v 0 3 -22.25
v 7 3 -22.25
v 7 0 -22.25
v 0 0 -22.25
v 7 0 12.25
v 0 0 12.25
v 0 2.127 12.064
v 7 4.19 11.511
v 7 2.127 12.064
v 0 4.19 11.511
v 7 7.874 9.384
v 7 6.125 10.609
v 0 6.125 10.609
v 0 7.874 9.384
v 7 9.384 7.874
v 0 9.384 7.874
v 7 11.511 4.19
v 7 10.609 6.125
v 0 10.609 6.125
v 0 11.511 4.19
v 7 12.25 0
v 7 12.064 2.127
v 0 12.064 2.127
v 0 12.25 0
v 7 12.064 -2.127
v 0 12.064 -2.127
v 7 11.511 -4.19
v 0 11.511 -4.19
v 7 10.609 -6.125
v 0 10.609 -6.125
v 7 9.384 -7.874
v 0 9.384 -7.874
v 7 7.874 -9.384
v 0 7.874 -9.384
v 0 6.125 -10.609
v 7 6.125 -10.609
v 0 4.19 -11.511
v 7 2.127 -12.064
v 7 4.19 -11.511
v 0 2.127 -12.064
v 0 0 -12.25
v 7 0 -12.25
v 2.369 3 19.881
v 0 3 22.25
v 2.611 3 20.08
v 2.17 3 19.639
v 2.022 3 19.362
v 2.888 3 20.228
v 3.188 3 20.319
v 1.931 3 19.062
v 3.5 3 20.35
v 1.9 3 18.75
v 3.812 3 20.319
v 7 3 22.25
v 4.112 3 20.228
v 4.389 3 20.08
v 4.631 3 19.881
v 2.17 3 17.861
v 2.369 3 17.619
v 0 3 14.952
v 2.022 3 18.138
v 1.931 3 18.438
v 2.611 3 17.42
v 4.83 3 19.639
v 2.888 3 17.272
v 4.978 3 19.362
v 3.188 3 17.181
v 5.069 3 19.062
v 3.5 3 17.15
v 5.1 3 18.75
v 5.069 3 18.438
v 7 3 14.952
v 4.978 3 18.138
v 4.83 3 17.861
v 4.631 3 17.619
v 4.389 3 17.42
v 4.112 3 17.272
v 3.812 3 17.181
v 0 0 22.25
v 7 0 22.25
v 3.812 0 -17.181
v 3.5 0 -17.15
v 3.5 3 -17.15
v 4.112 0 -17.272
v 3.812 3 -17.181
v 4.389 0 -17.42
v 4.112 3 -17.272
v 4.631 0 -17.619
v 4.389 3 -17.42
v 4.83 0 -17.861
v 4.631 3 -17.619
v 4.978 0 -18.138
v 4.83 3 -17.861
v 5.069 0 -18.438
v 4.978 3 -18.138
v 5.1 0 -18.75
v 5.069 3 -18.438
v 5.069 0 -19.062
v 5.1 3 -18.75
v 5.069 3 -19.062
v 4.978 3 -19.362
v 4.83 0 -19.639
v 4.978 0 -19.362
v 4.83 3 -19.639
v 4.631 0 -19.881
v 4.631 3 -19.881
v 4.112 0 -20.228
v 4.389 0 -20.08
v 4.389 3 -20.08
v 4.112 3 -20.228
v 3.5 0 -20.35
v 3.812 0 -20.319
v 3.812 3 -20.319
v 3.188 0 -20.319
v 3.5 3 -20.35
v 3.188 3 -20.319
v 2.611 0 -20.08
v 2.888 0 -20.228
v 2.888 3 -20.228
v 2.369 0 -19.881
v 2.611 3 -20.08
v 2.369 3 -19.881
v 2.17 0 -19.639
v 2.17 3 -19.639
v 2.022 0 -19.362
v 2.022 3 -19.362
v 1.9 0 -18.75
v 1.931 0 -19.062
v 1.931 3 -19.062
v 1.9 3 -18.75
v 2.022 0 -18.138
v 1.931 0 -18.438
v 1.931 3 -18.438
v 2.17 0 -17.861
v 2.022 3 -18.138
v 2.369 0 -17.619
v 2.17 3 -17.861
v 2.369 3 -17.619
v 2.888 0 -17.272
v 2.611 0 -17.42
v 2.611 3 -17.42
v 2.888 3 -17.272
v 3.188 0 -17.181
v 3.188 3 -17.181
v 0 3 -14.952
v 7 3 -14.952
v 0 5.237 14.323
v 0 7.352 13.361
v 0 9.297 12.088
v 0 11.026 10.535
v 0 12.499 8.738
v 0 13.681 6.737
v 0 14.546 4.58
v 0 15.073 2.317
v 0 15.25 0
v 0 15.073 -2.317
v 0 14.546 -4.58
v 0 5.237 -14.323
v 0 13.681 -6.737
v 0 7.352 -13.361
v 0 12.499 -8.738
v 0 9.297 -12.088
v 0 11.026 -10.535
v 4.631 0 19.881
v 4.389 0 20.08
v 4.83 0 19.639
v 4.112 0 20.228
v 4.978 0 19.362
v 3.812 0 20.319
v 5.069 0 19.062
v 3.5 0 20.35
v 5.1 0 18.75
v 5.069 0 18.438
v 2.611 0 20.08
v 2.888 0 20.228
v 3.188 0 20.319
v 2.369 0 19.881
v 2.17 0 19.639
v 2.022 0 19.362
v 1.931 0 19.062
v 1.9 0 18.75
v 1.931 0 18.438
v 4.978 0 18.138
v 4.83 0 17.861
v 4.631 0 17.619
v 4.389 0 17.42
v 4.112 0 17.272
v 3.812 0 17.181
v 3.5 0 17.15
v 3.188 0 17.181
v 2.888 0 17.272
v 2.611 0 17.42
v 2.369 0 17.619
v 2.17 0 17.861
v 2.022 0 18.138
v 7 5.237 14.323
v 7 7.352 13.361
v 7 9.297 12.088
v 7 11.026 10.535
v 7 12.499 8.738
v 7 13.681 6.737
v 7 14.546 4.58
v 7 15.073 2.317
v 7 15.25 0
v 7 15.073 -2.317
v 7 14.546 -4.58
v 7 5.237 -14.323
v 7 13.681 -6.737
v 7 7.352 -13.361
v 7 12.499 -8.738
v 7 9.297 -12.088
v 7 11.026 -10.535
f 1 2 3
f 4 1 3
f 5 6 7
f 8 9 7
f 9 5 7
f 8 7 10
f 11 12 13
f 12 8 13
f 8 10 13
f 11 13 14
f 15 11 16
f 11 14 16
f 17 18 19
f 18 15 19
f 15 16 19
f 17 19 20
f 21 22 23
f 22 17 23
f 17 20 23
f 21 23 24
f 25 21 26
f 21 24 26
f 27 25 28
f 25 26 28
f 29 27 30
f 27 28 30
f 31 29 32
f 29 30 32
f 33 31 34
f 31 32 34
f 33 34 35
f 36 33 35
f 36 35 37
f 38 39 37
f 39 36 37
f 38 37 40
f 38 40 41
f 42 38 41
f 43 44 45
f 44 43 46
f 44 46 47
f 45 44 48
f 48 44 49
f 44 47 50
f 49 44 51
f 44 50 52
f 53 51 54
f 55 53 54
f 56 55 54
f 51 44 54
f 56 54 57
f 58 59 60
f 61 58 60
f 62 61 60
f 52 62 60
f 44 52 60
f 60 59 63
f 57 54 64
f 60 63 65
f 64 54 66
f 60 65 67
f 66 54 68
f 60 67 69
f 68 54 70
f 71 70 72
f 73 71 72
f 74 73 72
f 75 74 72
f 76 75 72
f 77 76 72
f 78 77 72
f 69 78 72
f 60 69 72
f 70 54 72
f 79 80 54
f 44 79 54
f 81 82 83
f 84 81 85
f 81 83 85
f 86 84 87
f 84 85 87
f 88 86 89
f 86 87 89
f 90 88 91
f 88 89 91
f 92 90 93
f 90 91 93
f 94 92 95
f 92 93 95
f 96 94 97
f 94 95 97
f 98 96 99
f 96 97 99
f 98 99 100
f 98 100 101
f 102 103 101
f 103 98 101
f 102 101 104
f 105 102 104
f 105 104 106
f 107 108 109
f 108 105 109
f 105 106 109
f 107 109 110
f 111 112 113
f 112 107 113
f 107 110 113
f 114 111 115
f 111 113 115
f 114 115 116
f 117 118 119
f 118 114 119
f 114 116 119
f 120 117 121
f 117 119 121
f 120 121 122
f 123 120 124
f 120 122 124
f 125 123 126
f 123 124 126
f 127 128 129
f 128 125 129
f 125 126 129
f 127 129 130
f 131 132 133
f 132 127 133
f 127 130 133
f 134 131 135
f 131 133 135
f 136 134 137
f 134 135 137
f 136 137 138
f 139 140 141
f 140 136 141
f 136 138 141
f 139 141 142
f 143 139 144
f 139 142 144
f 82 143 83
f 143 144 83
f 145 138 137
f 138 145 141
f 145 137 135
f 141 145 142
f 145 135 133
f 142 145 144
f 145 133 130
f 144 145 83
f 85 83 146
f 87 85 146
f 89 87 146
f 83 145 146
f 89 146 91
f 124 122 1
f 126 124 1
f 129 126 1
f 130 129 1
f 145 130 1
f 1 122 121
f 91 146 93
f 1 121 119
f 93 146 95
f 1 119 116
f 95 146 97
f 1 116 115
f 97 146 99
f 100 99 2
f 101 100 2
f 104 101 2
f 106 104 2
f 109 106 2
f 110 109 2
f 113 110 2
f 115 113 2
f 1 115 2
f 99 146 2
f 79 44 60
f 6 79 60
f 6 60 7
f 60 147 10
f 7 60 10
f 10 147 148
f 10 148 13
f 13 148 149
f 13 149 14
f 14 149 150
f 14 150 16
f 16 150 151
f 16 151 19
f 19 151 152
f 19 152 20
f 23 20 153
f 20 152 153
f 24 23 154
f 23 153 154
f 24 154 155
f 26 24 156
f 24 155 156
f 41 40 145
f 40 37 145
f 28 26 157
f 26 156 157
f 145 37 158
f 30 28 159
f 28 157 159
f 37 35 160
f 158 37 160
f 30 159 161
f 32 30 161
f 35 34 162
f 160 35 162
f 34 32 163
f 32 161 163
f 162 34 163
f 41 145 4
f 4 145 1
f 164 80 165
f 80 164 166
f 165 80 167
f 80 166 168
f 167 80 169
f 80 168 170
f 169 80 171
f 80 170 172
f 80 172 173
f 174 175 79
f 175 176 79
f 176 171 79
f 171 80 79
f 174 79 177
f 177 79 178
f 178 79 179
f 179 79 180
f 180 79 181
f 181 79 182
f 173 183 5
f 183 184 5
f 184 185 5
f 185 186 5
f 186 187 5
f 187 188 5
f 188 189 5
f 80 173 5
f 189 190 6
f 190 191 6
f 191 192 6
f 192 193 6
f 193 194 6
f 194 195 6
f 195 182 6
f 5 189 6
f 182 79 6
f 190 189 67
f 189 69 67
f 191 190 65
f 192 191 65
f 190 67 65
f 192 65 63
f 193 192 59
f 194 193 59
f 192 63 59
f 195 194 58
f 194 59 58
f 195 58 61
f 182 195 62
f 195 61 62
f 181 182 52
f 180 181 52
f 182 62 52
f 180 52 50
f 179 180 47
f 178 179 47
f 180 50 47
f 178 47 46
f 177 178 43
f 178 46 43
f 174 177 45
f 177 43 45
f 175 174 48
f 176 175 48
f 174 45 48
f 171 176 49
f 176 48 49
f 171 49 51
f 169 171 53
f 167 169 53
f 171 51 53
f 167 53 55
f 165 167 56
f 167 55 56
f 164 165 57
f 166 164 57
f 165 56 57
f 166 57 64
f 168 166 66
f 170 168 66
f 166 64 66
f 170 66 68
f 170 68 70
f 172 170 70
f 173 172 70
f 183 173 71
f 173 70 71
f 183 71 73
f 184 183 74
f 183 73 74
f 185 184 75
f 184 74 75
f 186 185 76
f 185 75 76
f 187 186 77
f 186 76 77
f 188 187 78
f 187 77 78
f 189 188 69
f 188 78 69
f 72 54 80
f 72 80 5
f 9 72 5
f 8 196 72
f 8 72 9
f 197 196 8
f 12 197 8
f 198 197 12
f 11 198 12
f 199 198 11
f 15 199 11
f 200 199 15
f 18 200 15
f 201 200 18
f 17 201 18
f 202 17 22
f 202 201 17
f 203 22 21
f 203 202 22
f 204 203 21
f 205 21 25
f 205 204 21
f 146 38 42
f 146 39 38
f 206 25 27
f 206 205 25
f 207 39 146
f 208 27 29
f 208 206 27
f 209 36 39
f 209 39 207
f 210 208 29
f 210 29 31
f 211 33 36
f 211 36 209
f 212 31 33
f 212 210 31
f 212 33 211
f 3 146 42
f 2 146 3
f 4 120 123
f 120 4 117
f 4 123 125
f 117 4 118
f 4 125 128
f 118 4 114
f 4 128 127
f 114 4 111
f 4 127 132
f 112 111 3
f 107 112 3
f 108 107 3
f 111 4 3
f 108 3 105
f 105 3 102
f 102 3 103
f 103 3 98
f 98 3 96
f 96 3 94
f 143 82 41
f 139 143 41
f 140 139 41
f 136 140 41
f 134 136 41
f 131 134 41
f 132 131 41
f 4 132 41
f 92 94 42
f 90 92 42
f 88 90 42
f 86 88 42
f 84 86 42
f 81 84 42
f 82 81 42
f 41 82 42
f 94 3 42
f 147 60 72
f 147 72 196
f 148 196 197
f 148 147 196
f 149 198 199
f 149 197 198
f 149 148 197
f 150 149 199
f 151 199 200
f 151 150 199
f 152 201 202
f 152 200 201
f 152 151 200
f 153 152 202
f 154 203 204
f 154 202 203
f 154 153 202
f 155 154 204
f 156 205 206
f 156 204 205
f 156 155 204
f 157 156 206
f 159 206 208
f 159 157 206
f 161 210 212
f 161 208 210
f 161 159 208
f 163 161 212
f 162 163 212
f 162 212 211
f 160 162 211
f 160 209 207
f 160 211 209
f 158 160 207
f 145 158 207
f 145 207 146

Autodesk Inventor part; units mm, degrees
ref_plane "YZ Plane" through (0, 0, 0) normal (1, 0, 0) x (0, 1, 0)
ref_plane "XZ Plane" through (0, 0, 0) normal (0, 1, 0) x (-1, 0, 0)
ref_plane "XY Plane" through (0, 0, 0) normal (0, 0, 1) x (1, 0, 0)
sketch "Skizze1" plane through (0, 0, 0) normal (1, 0, 0) x (0, 1, 0)
  arc A0 (0, -12.25) -> (0, 12.25) centre (0, 0) ccw
  line L0 (0, 0) -> (0, 12.25) construction
  line L1 (0, 0) -> (0, -12.25) construction
  arc A1 (0, -15.25) -> (0, 15.25) centre (0, 0) ccw
  line L2 (0, 15.25) -> (0, 12.25)
  line L3 (0, -12.25) -> (0, -15.25)
  dimension "d0" = 12.25
  dimension "d1" = 180
  dimension "d3" = 15.25
extrude "Extrusion1" add sketch "Skizze1" along normal blind 7
sketch "Skizze3" plane through (7, 0, 0) normal (1, 0, 0) x (0, 0, -1)
  arc A0 (15.25, 0) -> (-15.25, 0) centre (0, 0) ccw projected
  line L0 (-15.25, 0) -> (-22.25, 0)
  line L1 (-22.25, 0) -> (-22.25, 3)
  line L2 (-22.25, 3) -> (-14.952, 3)
  dimension "d6" = 7
  dimension "d7" = 3
extrude "Extrusion3" add sketch "Skizze3" against normal blind 7
sketch "Skizze5" plane through (0, 0, 12.25) normal (0, -1, 0) x (1, 0, 0)
  line L0 (7, 10) -> (7, 0) projected
  line L1 (7, 10) -> (0, 10) projected
  point P0 (0, -12.25)
  point P1 (3.5, 6.5)
  dimension "d19" = 3.5
  dimension "d20" = 3.5
hole "Bohrung1" at (3.5, 0, 18.75) direction (0, 1, 0) diameter 3.2 end through all
mirror "Spiegeln1" about plane through (0, 0, 0) normal (0, 0, 1) of "Extrusion3", "Bohrung1"
properties part number "klemme"
